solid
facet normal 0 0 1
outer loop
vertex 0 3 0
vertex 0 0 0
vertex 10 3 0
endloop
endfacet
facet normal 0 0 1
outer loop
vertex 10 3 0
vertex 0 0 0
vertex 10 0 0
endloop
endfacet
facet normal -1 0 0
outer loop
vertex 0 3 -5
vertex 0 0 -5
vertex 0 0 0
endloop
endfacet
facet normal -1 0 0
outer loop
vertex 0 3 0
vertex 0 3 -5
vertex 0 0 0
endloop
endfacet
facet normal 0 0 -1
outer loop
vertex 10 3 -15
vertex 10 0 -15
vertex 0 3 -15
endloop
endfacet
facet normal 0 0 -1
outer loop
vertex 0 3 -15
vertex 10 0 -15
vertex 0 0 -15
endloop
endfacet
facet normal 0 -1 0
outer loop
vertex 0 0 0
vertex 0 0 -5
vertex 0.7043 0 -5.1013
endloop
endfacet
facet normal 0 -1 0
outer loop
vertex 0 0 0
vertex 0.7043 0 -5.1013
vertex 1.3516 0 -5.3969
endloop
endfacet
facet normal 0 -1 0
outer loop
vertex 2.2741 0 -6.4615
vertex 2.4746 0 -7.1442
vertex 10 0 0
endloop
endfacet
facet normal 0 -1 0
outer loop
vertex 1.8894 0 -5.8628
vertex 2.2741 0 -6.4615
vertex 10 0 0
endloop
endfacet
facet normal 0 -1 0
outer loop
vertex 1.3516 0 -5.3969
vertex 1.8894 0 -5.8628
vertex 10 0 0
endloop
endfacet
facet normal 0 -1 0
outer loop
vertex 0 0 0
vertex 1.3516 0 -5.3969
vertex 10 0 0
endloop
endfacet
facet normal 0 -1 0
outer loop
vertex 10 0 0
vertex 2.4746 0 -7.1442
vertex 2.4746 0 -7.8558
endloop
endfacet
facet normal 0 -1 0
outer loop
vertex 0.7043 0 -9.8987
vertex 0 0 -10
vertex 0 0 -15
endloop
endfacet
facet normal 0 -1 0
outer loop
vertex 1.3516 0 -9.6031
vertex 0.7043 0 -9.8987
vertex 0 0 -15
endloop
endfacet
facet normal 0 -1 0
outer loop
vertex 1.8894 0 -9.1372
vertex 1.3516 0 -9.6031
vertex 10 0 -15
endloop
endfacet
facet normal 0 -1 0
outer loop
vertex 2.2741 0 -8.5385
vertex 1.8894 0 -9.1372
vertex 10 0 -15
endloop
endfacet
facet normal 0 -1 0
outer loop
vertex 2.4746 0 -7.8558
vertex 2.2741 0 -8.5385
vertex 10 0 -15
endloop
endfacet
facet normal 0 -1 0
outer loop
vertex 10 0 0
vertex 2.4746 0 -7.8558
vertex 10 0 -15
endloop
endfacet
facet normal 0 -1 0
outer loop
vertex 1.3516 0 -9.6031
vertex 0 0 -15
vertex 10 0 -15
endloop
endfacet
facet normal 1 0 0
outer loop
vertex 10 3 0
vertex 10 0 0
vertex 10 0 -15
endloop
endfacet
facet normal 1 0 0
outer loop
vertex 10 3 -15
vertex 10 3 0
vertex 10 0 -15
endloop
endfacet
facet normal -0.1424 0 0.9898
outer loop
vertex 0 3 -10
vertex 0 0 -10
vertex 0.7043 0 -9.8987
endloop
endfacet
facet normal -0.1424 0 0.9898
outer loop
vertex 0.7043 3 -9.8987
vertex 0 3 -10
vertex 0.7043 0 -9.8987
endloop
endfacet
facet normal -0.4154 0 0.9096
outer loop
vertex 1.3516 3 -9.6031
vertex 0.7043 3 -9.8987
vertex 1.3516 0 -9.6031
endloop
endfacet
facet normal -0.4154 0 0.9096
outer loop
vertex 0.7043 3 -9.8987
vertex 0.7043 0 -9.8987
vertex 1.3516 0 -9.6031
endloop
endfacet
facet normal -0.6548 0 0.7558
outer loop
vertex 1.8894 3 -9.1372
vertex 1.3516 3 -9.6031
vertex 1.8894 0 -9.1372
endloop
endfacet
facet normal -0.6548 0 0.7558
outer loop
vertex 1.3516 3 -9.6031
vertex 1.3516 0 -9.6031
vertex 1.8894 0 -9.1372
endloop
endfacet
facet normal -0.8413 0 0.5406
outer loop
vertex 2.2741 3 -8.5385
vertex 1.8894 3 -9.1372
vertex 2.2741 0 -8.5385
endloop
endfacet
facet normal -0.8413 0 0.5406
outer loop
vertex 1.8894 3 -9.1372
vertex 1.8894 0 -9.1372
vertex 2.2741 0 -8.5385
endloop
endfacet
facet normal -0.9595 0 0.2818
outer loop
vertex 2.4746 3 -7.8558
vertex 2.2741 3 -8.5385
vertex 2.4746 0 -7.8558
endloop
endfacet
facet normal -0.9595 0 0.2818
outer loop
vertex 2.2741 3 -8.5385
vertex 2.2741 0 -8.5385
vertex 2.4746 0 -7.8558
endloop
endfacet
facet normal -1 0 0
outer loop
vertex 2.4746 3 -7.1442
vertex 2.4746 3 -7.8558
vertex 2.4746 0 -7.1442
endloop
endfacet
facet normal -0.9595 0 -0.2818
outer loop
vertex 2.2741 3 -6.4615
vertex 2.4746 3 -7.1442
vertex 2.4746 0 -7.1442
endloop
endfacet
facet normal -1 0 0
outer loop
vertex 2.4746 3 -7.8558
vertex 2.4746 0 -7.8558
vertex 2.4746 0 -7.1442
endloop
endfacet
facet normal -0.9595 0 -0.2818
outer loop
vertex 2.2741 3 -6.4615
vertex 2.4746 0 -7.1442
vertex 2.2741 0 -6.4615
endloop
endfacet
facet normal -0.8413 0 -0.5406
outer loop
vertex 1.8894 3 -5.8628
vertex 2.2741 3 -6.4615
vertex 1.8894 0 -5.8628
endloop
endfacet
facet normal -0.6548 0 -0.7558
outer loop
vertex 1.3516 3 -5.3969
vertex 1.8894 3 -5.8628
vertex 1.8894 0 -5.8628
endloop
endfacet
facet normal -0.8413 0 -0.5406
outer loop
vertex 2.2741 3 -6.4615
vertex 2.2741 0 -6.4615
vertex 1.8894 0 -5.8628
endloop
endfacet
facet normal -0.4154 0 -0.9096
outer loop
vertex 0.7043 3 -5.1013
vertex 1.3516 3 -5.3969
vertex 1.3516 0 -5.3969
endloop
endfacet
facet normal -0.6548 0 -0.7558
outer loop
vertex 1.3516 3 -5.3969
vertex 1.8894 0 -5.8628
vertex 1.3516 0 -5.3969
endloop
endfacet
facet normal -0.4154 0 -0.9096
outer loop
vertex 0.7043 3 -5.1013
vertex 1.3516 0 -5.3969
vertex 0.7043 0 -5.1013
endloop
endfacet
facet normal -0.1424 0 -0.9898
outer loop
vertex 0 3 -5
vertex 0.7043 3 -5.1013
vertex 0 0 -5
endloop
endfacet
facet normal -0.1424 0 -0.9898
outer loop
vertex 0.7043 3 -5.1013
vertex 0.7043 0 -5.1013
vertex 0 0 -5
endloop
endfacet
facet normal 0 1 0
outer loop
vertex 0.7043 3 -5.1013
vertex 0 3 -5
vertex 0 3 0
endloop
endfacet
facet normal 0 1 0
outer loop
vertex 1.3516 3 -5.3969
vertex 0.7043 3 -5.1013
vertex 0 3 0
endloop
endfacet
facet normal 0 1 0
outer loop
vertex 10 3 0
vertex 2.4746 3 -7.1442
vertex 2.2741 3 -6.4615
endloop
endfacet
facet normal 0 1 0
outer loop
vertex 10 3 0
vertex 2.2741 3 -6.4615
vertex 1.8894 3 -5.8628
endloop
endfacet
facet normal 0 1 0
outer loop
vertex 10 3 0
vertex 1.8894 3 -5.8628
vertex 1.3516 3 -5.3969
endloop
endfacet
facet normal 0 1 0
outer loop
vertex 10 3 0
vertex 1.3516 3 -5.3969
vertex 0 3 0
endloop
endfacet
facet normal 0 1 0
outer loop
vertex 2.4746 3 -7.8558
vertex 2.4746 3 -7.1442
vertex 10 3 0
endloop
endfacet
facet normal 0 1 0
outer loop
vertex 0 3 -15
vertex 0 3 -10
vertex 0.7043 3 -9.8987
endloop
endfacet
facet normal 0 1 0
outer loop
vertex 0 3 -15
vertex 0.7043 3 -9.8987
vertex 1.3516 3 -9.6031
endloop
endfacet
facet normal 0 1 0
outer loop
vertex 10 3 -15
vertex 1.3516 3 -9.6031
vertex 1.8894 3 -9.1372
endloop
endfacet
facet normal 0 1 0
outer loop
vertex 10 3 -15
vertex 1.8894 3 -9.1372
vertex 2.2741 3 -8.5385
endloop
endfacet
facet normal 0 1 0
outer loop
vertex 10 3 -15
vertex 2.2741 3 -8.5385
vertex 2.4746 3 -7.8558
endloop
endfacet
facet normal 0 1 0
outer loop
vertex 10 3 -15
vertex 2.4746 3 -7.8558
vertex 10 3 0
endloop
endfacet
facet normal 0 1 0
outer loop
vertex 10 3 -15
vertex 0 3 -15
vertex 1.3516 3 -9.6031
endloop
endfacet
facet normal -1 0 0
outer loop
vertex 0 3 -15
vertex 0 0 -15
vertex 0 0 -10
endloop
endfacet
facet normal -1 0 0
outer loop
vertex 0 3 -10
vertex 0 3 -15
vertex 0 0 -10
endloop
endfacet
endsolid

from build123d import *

# Parameters (mm, degrees)
EXTRUDE_1_DEPTH = 3


with BuildPart() as part:
    # Эскиз1 → Бобышка-Вытянуть1 (new body)
    with BuildSketch(Plane(origin=(0, 0, 0), x_dir=(1, 0, 0), z_dir=(0, 1, 0))):
        with BuildLine():
            Line((0, 15), (0, 10))
            ThreePointArc((0, 10), (2.5, 7.5), (0, 5))
            Line((0, 5), (0, 0))
            Line((0, 0), (10, 0))
            Line((10, 0), (10, 15))
            Line((10, 15), (0, 15))
        make_face()
    extrude(amount=EXTRUDE_1_DEPTH)


solid = part.part
